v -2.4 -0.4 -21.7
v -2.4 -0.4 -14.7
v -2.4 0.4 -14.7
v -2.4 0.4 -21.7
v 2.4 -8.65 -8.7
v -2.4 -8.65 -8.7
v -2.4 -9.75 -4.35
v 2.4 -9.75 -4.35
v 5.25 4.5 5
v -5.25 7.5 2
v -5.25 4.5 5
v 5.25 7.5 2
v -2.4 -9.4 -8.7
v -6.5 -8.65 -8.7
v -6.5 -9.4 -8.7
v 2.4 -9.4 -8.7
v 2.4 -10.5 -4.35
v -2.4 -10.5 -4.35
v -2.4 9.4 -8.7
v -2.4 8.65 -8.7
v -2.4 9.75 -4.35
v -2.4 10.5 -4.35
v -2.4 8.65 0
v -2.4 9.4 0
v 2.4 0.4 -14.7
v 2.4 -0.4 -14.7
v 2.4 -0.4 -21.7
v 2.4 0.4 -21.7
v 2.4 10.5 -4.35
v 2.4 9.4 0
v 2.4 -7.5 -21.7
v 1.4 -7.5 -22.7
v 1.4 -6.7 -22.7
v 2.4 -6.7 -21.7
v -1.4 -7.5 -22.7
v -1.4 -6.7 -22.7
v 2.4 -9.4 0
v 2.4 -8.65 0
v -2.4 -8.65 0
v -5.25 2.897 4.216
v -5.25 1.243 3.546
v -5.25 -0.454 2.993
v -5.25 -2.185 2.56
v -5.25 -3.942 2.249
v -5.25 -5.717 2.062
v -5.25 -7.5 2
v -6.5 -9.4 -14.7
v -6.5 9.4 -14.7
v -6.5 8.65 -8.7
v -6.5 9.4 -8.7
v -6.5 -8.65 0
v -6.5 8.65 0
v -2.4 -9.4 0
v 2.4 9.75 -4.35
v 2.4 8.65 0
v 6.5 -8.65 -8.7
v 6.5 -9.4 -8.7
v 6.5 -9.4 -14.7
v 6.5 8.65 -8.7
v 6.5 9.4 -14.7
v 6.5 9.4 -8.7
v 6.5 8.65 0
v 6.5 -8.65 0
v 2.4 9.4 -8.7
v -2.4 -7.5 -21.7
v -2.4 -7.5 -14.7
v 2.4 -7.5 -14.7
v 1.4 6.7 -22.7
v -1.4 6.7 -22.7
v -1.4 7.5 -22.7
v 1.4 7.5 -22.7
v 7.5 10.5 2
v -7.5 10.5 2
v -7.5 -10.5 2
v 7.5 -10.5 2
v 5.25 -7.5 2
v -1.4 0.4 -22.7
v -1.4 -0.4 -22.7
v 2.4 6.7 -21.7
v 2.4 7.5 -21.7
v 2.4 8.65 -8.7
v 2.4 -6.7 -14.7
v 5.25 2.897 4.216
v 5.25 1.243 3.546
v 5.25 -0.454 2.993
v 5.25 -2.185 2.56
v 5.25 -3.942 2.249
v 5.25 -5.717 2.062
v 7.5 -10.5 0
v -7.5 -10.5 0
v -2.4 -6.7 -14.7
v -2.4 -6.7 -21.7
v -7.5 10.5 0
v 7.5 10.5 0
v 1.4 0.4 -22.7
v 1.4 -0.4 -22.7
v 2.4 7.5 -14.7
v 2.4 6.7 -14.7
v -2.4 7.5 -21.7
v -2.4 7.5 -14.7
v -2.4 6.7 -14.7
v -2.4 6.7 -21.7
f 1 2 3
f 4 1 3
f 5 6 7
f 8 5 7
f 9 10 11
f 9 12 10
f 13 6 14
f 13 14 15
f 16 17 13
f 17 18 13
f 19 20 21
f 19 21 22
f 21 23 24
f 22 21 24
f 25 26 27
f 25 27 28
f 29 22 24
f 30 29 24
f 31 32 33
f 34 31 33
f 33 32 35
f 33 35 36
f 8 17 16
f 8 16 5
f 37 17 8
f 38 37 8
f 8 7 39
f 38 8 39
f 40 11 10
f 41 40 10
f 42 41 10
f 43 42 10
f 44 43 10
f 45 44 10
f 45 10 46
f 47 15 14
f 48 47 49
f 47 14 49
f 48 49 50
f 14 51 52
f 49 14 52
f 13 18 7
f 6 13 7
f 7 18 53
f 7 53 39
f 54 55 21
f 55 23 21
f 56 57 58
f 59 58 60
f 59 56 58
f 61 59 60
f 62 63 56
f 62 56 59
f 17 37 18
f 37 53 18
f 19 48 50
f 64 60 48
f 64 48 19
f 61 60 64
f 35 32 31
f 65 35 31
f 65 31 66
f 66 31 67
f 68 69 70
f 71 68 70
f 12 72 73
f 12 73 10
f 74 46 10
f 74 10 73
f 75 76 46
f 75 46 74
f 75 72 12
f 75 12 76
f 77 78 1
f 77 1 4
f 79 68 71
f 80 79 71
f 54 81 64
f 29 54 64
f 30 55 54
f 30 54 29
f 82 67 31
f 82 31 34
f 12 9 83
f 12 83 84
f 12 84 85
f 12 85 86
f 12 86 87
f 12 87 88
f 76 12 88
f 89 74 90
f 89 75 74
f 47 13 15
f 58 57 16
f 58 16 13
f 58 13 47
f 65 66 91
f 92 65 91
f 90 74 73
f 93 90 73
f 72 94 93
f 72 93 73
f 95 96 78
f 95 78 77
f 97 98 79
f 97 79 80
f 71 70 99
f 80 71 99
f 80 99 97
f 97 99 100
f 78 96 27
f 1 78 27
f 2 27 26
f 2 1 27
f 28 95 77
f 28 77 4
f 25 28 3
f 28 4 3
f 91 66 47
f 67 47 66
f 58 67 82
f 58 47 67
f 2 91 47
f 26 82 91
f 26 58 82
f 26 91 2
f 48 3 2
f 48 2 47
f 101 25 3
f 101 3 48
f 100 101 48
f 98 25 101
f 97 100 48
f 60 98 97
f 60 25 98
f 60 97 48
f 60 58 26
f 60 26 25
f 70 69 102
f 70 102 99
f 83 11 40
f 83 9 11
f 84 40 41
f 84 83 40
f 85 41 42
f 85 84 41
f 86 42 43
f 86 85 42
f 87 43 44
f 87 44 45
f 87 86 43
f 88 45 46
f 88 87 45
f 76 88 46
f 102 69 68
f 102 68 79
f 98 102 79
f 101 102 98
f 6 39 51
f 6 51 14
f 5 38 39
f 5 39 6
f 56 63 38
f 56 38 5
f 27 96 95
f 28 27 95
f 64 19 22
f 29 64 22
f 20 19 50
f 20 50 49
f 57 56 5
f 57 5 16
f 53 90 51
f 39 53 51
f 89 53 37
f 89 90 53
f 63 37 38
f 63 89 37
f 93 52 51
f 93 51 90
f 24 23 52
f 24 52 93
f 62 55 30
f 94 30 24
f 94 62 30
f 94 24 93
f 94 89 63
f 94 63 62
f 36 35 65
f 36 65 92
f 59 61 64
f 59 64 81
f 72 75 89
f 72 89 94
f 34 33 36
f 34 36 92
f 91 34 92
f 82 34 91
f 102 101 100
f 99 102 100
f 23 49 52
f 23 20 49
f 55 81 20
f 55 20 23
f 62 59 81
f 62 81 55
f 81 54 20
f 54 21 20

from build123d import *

# Parameters (mm, degrees)
F1_DEPTH = 6.5
F2_DEPTH = 7.5
F3_DEPTH = 5.25
F0_W     = 0.8
F0_H     = 8
F4_DEPTH = 2.4
F5_SIZE  = 1


with BuildPart() as f1:
    # F0 (on Right) → F1 (new body, symmetric)
    with BuildSketch(Plane.YZ):
        Polygon((8.65, 0), (-8.65, 0), (-8.65, -8.7), (-9.4, -8.7), (-9.4, -14.7), (-7.5, -14.7), (-6.7, -14.7), (-0.4, -14.7), (0.4, -14.7), (6.7, -14.7), (7.5, -14.7), (9.4, -14.7), (9.4, -8.7), (8.65, -8.7), align=None)
    extrude(amount=F1_DEPTH, both=True)

    # F0 (on Right) → F2 (join, symmetric)
    with BuildSketch(Plane.YZ):
        Polygon((-10.5, 2), (-10.5, 0), (-9.4, 0), (-8.65, 0), (8.65, 0), (9.4, 0), (10.5, 0), (10.5, 2), (7.5, 2), (-7.5, 2), align=None)
    extrude(amount=F2_DEPTH, both=True)

    # F0 (on Right) → F3 (join, symmetric)
    with BuildSketch(Plane.YZ):
        with BuildLine():
            ThreePointArc((4.5, 5), (-1.315342, 2.761366), (-7.5, 2))
            Line((-7.5, 2), (7.5, 2))
            Line((7.5, 2), (4.5, 5))
        make_face()
    extrude(amount=F3_DEPTH, both=True)

    # F0 (on Right) → F4 (join, symmetric)
    with BuildSketch(Plane.YZ):
        Polygon((-8.65, 0), (-9.4, 0), (-10.5, -4.35), (-9.4, -8.7), (-8.65, -8.7), (-9.75, -4.35), align=None)
        Polygon((9.4, 0), (8.65, 0), (9.75, -4.35), (8.65, -8.7), (9.4, -8.7), (10.5, -4.35), align=None)
        with Locations((7.1, -18.7)):
            Rectangle(F0_W, F0_H)
        with Locations((0, -18.7)):
            Rectangle(F0_W, F0_H)
        with Locations((-7.1, -18.7)):
            Rectangle(F0_W, F0_H)
    extrude(amount=F4_DEPTH, both=True)

    # F5
    f5_edges = [f1.edges().sort_by_distance(p)[0] for p in [
        (2.4, -7.1, -22.7),
        (2.4, 0, -22.7),
        (-2.4, 7.1, -22.7),
        (2.4, 7.1, -22.7),
        (-2.4, 0, -22.7),
        (-2.4, -7.1, -22.7),
    ]]
    chamfer(f5_edges, length=F5_SIZE)


solid = f1.part
